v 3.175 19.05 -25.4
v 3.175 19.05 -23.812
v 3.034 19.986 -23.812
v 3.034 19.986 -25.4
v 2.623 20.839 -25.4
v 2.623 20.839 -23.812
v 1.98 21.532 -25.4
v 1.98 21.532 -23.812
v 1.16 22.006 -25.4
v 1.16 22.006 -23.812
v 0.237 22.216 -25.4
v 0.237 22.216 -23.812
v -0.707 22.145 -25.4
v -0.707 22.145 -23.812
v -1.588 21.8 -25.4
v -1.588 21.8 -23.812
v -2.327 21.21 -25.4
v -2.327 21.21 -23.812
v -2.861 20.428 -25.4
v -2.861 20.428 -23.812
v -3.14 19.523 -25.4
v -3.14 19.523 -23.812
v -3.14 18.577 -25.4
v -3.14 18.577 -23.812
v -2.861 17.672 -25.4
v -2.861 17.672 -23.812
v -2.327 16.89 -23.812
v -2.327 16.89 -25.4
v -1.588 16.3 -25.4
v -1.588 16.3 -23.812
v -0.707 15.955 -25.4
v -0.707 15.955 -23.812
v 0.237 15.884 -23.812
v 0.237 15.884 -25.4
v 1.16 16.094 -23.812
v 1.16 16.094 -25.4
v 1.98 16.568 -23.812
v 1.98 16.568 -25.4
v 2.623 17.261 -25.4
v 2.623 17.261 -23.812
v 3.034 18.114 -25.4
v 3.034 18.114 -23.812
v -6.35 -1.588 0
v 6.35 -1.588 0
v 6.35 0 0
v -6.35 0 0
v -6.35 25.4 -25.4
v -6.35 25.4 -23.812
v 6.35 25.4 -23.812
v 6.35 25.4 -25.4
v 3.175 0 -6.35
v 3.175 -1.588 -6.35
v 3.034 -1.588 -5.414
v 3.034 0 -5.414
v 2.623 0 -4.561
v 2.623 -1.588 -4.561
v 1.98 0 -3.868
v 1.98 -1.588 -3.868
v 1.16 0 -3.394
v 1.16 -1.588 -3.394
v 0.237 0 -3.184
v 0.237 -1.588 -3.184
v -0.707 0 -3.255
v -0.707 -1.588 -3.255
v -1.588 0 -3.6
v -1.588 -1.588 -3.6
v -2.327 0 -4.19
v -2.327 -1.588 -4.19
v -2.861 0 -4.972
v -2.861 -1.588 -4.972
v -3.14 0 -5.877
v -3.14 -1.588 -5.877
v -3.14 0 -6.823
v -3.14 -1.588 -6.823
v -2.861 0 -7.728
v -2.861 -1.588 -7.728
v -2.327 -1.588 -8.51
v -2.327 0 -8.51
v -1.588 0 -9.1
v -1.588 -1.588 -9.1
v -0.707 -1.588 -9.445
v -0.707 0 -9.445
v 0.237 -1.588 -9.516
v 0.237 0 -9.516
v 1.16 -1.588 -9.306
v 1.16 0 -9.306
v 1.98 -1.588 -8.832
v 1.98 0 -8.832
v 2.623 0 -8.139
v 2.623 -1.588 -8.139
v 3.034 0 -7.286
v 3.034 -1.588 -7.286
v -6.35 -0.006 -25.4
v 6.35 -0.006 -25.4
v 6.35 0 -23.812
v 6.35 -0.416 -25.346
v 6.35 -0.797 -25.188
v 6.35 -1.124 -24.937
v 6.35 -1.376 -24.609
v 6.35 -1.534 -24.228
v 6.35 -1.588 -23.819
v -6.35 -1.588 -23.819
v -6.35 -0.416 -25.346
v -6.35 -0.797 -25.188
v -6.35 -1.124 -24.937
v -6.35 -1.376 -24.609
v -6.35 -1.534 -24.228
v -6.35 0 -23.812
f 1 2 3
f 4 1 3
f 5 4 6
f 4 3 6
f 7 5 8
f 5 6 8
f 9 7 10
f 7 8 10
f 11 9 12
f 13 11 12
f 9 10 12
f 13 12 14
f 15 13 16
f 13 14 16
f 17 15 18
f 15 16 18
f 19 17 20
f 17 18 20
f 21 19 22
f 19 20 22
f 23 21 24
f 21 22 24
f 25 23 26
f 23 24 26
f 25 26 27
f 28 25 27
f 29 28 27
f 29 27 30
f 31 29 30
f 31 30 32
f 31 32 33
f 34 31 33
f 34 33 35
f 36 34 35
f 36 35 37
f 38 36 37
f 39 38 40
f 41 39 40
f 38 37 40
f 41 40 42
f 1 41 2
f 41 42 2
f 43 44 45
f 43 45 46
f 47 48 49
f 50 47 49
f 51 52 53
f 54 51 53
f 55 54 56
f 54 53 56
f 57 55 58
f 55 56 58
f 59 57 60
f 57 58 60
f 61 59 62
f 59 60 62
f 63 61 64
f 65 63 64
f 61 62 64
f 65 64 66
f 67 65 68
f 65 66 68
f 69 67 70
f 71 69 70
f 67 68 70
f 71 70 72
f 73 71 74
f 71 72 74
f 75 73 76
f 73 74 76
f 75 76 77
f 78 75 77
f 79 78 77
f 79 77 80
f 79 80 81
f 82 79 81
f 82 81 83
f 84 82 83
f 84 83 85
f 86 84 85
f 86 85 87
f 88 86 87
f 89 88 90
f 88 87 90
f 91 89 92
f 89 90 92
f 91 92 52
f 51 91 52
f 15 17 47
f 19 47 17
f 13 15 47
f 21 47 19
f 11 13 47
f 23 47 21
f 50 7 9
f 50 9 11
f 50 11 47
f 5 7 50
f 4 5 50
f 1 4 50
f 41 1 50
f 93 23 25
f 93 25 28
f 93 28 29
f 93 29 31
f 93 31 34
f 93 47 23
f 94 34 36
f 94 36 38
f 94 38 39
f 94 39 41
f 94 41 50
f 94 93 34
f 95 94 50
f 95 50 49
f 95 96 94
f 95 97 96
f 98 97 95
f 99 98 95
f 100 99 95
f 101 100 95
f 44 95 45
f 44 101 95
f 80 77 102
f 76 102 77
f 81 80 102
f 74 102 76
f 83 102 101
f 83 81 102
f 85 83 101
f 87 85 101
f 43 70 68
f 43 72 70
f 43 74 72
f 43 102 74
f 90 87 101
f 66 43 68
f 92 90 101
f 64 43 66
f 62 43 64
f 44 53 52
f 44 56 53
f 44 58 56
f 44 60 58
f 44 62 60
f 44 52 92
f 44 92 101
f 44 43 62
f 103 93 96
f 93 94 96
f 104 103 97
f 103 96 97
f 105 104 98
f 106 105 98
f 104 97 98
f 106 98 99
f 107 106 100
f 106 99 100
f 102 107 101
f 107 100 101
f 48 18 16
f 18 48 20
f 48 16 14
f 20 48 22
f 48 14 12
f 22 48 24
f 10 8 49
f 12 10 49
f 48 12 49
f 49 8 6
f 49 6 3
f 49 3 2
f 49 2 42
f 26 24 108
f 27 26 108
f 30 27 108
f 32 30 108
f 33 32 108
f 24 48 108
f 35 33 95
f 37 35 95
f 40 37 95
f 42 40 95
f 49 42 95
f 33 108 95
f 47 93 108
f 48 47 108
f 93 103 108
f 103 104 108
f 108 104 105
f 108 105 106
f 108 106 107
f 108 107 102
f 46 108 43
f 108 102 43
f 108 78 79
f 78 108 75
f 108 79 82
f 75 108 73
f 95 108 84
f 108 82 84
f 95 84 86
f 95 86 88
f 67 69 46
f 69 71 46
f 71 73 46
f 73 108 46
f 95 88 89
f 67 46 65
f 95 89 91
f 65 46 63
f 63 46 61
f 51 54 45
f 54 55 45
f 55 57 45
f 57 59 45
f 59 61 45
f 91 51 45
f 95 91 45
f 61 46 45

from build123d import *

# Parameters (mm, degrees)
F1_R     = 3.175
F2_DEPTH = 1.5875
F1_W     = 12.7
F1_H     = 1.5875
F3_DEPTH = 26.9875
F4_R     = 3.175
F5_DEPTH = 1.5875
F6_R     = 1.58102


with BuildPart() as f2:
    # F1 (on offset) → F2 (new body)
    with BuildSketch(Plane.XZ.offset(1.5875)):
        Polygon((6.35, 0), (0, 0), (-6.35, 0), (-6.35, -23.8125), (6.35, -23.8125), align=None)
        with Locations((0, -6.35)):
            Circle(F1_R, mode=Mode.SUBTRACT)
    extrude(amount=-F2_DEPTH)

    # F1 (on offset) → F3 (join)
    with BuildSketch(Plane.XZ.offset(1.5875)):
        with Locations((0, -24.60625)):
            Rectangle(F1_W, F1_H)
    extrude(amount=-F3_DEPTH)

    # F4 (on face) → F5 (cut)
    with BuildSketch(Plane.XY.offset(-23.8125)):
        with Locations((0, 19.05)):
            Circle(F4_R)
    extrude(amount=-F5_DEPTH, mode=Mode.SUBTRACT)

    # F6
    f6_edges = [f2.edges().sort_by_distance(p)[0] for p in [
        (0, -1.5875, -25.4),
    ]]
    fillet(f6_edges, radius=F6_R)


solid = f2.part
